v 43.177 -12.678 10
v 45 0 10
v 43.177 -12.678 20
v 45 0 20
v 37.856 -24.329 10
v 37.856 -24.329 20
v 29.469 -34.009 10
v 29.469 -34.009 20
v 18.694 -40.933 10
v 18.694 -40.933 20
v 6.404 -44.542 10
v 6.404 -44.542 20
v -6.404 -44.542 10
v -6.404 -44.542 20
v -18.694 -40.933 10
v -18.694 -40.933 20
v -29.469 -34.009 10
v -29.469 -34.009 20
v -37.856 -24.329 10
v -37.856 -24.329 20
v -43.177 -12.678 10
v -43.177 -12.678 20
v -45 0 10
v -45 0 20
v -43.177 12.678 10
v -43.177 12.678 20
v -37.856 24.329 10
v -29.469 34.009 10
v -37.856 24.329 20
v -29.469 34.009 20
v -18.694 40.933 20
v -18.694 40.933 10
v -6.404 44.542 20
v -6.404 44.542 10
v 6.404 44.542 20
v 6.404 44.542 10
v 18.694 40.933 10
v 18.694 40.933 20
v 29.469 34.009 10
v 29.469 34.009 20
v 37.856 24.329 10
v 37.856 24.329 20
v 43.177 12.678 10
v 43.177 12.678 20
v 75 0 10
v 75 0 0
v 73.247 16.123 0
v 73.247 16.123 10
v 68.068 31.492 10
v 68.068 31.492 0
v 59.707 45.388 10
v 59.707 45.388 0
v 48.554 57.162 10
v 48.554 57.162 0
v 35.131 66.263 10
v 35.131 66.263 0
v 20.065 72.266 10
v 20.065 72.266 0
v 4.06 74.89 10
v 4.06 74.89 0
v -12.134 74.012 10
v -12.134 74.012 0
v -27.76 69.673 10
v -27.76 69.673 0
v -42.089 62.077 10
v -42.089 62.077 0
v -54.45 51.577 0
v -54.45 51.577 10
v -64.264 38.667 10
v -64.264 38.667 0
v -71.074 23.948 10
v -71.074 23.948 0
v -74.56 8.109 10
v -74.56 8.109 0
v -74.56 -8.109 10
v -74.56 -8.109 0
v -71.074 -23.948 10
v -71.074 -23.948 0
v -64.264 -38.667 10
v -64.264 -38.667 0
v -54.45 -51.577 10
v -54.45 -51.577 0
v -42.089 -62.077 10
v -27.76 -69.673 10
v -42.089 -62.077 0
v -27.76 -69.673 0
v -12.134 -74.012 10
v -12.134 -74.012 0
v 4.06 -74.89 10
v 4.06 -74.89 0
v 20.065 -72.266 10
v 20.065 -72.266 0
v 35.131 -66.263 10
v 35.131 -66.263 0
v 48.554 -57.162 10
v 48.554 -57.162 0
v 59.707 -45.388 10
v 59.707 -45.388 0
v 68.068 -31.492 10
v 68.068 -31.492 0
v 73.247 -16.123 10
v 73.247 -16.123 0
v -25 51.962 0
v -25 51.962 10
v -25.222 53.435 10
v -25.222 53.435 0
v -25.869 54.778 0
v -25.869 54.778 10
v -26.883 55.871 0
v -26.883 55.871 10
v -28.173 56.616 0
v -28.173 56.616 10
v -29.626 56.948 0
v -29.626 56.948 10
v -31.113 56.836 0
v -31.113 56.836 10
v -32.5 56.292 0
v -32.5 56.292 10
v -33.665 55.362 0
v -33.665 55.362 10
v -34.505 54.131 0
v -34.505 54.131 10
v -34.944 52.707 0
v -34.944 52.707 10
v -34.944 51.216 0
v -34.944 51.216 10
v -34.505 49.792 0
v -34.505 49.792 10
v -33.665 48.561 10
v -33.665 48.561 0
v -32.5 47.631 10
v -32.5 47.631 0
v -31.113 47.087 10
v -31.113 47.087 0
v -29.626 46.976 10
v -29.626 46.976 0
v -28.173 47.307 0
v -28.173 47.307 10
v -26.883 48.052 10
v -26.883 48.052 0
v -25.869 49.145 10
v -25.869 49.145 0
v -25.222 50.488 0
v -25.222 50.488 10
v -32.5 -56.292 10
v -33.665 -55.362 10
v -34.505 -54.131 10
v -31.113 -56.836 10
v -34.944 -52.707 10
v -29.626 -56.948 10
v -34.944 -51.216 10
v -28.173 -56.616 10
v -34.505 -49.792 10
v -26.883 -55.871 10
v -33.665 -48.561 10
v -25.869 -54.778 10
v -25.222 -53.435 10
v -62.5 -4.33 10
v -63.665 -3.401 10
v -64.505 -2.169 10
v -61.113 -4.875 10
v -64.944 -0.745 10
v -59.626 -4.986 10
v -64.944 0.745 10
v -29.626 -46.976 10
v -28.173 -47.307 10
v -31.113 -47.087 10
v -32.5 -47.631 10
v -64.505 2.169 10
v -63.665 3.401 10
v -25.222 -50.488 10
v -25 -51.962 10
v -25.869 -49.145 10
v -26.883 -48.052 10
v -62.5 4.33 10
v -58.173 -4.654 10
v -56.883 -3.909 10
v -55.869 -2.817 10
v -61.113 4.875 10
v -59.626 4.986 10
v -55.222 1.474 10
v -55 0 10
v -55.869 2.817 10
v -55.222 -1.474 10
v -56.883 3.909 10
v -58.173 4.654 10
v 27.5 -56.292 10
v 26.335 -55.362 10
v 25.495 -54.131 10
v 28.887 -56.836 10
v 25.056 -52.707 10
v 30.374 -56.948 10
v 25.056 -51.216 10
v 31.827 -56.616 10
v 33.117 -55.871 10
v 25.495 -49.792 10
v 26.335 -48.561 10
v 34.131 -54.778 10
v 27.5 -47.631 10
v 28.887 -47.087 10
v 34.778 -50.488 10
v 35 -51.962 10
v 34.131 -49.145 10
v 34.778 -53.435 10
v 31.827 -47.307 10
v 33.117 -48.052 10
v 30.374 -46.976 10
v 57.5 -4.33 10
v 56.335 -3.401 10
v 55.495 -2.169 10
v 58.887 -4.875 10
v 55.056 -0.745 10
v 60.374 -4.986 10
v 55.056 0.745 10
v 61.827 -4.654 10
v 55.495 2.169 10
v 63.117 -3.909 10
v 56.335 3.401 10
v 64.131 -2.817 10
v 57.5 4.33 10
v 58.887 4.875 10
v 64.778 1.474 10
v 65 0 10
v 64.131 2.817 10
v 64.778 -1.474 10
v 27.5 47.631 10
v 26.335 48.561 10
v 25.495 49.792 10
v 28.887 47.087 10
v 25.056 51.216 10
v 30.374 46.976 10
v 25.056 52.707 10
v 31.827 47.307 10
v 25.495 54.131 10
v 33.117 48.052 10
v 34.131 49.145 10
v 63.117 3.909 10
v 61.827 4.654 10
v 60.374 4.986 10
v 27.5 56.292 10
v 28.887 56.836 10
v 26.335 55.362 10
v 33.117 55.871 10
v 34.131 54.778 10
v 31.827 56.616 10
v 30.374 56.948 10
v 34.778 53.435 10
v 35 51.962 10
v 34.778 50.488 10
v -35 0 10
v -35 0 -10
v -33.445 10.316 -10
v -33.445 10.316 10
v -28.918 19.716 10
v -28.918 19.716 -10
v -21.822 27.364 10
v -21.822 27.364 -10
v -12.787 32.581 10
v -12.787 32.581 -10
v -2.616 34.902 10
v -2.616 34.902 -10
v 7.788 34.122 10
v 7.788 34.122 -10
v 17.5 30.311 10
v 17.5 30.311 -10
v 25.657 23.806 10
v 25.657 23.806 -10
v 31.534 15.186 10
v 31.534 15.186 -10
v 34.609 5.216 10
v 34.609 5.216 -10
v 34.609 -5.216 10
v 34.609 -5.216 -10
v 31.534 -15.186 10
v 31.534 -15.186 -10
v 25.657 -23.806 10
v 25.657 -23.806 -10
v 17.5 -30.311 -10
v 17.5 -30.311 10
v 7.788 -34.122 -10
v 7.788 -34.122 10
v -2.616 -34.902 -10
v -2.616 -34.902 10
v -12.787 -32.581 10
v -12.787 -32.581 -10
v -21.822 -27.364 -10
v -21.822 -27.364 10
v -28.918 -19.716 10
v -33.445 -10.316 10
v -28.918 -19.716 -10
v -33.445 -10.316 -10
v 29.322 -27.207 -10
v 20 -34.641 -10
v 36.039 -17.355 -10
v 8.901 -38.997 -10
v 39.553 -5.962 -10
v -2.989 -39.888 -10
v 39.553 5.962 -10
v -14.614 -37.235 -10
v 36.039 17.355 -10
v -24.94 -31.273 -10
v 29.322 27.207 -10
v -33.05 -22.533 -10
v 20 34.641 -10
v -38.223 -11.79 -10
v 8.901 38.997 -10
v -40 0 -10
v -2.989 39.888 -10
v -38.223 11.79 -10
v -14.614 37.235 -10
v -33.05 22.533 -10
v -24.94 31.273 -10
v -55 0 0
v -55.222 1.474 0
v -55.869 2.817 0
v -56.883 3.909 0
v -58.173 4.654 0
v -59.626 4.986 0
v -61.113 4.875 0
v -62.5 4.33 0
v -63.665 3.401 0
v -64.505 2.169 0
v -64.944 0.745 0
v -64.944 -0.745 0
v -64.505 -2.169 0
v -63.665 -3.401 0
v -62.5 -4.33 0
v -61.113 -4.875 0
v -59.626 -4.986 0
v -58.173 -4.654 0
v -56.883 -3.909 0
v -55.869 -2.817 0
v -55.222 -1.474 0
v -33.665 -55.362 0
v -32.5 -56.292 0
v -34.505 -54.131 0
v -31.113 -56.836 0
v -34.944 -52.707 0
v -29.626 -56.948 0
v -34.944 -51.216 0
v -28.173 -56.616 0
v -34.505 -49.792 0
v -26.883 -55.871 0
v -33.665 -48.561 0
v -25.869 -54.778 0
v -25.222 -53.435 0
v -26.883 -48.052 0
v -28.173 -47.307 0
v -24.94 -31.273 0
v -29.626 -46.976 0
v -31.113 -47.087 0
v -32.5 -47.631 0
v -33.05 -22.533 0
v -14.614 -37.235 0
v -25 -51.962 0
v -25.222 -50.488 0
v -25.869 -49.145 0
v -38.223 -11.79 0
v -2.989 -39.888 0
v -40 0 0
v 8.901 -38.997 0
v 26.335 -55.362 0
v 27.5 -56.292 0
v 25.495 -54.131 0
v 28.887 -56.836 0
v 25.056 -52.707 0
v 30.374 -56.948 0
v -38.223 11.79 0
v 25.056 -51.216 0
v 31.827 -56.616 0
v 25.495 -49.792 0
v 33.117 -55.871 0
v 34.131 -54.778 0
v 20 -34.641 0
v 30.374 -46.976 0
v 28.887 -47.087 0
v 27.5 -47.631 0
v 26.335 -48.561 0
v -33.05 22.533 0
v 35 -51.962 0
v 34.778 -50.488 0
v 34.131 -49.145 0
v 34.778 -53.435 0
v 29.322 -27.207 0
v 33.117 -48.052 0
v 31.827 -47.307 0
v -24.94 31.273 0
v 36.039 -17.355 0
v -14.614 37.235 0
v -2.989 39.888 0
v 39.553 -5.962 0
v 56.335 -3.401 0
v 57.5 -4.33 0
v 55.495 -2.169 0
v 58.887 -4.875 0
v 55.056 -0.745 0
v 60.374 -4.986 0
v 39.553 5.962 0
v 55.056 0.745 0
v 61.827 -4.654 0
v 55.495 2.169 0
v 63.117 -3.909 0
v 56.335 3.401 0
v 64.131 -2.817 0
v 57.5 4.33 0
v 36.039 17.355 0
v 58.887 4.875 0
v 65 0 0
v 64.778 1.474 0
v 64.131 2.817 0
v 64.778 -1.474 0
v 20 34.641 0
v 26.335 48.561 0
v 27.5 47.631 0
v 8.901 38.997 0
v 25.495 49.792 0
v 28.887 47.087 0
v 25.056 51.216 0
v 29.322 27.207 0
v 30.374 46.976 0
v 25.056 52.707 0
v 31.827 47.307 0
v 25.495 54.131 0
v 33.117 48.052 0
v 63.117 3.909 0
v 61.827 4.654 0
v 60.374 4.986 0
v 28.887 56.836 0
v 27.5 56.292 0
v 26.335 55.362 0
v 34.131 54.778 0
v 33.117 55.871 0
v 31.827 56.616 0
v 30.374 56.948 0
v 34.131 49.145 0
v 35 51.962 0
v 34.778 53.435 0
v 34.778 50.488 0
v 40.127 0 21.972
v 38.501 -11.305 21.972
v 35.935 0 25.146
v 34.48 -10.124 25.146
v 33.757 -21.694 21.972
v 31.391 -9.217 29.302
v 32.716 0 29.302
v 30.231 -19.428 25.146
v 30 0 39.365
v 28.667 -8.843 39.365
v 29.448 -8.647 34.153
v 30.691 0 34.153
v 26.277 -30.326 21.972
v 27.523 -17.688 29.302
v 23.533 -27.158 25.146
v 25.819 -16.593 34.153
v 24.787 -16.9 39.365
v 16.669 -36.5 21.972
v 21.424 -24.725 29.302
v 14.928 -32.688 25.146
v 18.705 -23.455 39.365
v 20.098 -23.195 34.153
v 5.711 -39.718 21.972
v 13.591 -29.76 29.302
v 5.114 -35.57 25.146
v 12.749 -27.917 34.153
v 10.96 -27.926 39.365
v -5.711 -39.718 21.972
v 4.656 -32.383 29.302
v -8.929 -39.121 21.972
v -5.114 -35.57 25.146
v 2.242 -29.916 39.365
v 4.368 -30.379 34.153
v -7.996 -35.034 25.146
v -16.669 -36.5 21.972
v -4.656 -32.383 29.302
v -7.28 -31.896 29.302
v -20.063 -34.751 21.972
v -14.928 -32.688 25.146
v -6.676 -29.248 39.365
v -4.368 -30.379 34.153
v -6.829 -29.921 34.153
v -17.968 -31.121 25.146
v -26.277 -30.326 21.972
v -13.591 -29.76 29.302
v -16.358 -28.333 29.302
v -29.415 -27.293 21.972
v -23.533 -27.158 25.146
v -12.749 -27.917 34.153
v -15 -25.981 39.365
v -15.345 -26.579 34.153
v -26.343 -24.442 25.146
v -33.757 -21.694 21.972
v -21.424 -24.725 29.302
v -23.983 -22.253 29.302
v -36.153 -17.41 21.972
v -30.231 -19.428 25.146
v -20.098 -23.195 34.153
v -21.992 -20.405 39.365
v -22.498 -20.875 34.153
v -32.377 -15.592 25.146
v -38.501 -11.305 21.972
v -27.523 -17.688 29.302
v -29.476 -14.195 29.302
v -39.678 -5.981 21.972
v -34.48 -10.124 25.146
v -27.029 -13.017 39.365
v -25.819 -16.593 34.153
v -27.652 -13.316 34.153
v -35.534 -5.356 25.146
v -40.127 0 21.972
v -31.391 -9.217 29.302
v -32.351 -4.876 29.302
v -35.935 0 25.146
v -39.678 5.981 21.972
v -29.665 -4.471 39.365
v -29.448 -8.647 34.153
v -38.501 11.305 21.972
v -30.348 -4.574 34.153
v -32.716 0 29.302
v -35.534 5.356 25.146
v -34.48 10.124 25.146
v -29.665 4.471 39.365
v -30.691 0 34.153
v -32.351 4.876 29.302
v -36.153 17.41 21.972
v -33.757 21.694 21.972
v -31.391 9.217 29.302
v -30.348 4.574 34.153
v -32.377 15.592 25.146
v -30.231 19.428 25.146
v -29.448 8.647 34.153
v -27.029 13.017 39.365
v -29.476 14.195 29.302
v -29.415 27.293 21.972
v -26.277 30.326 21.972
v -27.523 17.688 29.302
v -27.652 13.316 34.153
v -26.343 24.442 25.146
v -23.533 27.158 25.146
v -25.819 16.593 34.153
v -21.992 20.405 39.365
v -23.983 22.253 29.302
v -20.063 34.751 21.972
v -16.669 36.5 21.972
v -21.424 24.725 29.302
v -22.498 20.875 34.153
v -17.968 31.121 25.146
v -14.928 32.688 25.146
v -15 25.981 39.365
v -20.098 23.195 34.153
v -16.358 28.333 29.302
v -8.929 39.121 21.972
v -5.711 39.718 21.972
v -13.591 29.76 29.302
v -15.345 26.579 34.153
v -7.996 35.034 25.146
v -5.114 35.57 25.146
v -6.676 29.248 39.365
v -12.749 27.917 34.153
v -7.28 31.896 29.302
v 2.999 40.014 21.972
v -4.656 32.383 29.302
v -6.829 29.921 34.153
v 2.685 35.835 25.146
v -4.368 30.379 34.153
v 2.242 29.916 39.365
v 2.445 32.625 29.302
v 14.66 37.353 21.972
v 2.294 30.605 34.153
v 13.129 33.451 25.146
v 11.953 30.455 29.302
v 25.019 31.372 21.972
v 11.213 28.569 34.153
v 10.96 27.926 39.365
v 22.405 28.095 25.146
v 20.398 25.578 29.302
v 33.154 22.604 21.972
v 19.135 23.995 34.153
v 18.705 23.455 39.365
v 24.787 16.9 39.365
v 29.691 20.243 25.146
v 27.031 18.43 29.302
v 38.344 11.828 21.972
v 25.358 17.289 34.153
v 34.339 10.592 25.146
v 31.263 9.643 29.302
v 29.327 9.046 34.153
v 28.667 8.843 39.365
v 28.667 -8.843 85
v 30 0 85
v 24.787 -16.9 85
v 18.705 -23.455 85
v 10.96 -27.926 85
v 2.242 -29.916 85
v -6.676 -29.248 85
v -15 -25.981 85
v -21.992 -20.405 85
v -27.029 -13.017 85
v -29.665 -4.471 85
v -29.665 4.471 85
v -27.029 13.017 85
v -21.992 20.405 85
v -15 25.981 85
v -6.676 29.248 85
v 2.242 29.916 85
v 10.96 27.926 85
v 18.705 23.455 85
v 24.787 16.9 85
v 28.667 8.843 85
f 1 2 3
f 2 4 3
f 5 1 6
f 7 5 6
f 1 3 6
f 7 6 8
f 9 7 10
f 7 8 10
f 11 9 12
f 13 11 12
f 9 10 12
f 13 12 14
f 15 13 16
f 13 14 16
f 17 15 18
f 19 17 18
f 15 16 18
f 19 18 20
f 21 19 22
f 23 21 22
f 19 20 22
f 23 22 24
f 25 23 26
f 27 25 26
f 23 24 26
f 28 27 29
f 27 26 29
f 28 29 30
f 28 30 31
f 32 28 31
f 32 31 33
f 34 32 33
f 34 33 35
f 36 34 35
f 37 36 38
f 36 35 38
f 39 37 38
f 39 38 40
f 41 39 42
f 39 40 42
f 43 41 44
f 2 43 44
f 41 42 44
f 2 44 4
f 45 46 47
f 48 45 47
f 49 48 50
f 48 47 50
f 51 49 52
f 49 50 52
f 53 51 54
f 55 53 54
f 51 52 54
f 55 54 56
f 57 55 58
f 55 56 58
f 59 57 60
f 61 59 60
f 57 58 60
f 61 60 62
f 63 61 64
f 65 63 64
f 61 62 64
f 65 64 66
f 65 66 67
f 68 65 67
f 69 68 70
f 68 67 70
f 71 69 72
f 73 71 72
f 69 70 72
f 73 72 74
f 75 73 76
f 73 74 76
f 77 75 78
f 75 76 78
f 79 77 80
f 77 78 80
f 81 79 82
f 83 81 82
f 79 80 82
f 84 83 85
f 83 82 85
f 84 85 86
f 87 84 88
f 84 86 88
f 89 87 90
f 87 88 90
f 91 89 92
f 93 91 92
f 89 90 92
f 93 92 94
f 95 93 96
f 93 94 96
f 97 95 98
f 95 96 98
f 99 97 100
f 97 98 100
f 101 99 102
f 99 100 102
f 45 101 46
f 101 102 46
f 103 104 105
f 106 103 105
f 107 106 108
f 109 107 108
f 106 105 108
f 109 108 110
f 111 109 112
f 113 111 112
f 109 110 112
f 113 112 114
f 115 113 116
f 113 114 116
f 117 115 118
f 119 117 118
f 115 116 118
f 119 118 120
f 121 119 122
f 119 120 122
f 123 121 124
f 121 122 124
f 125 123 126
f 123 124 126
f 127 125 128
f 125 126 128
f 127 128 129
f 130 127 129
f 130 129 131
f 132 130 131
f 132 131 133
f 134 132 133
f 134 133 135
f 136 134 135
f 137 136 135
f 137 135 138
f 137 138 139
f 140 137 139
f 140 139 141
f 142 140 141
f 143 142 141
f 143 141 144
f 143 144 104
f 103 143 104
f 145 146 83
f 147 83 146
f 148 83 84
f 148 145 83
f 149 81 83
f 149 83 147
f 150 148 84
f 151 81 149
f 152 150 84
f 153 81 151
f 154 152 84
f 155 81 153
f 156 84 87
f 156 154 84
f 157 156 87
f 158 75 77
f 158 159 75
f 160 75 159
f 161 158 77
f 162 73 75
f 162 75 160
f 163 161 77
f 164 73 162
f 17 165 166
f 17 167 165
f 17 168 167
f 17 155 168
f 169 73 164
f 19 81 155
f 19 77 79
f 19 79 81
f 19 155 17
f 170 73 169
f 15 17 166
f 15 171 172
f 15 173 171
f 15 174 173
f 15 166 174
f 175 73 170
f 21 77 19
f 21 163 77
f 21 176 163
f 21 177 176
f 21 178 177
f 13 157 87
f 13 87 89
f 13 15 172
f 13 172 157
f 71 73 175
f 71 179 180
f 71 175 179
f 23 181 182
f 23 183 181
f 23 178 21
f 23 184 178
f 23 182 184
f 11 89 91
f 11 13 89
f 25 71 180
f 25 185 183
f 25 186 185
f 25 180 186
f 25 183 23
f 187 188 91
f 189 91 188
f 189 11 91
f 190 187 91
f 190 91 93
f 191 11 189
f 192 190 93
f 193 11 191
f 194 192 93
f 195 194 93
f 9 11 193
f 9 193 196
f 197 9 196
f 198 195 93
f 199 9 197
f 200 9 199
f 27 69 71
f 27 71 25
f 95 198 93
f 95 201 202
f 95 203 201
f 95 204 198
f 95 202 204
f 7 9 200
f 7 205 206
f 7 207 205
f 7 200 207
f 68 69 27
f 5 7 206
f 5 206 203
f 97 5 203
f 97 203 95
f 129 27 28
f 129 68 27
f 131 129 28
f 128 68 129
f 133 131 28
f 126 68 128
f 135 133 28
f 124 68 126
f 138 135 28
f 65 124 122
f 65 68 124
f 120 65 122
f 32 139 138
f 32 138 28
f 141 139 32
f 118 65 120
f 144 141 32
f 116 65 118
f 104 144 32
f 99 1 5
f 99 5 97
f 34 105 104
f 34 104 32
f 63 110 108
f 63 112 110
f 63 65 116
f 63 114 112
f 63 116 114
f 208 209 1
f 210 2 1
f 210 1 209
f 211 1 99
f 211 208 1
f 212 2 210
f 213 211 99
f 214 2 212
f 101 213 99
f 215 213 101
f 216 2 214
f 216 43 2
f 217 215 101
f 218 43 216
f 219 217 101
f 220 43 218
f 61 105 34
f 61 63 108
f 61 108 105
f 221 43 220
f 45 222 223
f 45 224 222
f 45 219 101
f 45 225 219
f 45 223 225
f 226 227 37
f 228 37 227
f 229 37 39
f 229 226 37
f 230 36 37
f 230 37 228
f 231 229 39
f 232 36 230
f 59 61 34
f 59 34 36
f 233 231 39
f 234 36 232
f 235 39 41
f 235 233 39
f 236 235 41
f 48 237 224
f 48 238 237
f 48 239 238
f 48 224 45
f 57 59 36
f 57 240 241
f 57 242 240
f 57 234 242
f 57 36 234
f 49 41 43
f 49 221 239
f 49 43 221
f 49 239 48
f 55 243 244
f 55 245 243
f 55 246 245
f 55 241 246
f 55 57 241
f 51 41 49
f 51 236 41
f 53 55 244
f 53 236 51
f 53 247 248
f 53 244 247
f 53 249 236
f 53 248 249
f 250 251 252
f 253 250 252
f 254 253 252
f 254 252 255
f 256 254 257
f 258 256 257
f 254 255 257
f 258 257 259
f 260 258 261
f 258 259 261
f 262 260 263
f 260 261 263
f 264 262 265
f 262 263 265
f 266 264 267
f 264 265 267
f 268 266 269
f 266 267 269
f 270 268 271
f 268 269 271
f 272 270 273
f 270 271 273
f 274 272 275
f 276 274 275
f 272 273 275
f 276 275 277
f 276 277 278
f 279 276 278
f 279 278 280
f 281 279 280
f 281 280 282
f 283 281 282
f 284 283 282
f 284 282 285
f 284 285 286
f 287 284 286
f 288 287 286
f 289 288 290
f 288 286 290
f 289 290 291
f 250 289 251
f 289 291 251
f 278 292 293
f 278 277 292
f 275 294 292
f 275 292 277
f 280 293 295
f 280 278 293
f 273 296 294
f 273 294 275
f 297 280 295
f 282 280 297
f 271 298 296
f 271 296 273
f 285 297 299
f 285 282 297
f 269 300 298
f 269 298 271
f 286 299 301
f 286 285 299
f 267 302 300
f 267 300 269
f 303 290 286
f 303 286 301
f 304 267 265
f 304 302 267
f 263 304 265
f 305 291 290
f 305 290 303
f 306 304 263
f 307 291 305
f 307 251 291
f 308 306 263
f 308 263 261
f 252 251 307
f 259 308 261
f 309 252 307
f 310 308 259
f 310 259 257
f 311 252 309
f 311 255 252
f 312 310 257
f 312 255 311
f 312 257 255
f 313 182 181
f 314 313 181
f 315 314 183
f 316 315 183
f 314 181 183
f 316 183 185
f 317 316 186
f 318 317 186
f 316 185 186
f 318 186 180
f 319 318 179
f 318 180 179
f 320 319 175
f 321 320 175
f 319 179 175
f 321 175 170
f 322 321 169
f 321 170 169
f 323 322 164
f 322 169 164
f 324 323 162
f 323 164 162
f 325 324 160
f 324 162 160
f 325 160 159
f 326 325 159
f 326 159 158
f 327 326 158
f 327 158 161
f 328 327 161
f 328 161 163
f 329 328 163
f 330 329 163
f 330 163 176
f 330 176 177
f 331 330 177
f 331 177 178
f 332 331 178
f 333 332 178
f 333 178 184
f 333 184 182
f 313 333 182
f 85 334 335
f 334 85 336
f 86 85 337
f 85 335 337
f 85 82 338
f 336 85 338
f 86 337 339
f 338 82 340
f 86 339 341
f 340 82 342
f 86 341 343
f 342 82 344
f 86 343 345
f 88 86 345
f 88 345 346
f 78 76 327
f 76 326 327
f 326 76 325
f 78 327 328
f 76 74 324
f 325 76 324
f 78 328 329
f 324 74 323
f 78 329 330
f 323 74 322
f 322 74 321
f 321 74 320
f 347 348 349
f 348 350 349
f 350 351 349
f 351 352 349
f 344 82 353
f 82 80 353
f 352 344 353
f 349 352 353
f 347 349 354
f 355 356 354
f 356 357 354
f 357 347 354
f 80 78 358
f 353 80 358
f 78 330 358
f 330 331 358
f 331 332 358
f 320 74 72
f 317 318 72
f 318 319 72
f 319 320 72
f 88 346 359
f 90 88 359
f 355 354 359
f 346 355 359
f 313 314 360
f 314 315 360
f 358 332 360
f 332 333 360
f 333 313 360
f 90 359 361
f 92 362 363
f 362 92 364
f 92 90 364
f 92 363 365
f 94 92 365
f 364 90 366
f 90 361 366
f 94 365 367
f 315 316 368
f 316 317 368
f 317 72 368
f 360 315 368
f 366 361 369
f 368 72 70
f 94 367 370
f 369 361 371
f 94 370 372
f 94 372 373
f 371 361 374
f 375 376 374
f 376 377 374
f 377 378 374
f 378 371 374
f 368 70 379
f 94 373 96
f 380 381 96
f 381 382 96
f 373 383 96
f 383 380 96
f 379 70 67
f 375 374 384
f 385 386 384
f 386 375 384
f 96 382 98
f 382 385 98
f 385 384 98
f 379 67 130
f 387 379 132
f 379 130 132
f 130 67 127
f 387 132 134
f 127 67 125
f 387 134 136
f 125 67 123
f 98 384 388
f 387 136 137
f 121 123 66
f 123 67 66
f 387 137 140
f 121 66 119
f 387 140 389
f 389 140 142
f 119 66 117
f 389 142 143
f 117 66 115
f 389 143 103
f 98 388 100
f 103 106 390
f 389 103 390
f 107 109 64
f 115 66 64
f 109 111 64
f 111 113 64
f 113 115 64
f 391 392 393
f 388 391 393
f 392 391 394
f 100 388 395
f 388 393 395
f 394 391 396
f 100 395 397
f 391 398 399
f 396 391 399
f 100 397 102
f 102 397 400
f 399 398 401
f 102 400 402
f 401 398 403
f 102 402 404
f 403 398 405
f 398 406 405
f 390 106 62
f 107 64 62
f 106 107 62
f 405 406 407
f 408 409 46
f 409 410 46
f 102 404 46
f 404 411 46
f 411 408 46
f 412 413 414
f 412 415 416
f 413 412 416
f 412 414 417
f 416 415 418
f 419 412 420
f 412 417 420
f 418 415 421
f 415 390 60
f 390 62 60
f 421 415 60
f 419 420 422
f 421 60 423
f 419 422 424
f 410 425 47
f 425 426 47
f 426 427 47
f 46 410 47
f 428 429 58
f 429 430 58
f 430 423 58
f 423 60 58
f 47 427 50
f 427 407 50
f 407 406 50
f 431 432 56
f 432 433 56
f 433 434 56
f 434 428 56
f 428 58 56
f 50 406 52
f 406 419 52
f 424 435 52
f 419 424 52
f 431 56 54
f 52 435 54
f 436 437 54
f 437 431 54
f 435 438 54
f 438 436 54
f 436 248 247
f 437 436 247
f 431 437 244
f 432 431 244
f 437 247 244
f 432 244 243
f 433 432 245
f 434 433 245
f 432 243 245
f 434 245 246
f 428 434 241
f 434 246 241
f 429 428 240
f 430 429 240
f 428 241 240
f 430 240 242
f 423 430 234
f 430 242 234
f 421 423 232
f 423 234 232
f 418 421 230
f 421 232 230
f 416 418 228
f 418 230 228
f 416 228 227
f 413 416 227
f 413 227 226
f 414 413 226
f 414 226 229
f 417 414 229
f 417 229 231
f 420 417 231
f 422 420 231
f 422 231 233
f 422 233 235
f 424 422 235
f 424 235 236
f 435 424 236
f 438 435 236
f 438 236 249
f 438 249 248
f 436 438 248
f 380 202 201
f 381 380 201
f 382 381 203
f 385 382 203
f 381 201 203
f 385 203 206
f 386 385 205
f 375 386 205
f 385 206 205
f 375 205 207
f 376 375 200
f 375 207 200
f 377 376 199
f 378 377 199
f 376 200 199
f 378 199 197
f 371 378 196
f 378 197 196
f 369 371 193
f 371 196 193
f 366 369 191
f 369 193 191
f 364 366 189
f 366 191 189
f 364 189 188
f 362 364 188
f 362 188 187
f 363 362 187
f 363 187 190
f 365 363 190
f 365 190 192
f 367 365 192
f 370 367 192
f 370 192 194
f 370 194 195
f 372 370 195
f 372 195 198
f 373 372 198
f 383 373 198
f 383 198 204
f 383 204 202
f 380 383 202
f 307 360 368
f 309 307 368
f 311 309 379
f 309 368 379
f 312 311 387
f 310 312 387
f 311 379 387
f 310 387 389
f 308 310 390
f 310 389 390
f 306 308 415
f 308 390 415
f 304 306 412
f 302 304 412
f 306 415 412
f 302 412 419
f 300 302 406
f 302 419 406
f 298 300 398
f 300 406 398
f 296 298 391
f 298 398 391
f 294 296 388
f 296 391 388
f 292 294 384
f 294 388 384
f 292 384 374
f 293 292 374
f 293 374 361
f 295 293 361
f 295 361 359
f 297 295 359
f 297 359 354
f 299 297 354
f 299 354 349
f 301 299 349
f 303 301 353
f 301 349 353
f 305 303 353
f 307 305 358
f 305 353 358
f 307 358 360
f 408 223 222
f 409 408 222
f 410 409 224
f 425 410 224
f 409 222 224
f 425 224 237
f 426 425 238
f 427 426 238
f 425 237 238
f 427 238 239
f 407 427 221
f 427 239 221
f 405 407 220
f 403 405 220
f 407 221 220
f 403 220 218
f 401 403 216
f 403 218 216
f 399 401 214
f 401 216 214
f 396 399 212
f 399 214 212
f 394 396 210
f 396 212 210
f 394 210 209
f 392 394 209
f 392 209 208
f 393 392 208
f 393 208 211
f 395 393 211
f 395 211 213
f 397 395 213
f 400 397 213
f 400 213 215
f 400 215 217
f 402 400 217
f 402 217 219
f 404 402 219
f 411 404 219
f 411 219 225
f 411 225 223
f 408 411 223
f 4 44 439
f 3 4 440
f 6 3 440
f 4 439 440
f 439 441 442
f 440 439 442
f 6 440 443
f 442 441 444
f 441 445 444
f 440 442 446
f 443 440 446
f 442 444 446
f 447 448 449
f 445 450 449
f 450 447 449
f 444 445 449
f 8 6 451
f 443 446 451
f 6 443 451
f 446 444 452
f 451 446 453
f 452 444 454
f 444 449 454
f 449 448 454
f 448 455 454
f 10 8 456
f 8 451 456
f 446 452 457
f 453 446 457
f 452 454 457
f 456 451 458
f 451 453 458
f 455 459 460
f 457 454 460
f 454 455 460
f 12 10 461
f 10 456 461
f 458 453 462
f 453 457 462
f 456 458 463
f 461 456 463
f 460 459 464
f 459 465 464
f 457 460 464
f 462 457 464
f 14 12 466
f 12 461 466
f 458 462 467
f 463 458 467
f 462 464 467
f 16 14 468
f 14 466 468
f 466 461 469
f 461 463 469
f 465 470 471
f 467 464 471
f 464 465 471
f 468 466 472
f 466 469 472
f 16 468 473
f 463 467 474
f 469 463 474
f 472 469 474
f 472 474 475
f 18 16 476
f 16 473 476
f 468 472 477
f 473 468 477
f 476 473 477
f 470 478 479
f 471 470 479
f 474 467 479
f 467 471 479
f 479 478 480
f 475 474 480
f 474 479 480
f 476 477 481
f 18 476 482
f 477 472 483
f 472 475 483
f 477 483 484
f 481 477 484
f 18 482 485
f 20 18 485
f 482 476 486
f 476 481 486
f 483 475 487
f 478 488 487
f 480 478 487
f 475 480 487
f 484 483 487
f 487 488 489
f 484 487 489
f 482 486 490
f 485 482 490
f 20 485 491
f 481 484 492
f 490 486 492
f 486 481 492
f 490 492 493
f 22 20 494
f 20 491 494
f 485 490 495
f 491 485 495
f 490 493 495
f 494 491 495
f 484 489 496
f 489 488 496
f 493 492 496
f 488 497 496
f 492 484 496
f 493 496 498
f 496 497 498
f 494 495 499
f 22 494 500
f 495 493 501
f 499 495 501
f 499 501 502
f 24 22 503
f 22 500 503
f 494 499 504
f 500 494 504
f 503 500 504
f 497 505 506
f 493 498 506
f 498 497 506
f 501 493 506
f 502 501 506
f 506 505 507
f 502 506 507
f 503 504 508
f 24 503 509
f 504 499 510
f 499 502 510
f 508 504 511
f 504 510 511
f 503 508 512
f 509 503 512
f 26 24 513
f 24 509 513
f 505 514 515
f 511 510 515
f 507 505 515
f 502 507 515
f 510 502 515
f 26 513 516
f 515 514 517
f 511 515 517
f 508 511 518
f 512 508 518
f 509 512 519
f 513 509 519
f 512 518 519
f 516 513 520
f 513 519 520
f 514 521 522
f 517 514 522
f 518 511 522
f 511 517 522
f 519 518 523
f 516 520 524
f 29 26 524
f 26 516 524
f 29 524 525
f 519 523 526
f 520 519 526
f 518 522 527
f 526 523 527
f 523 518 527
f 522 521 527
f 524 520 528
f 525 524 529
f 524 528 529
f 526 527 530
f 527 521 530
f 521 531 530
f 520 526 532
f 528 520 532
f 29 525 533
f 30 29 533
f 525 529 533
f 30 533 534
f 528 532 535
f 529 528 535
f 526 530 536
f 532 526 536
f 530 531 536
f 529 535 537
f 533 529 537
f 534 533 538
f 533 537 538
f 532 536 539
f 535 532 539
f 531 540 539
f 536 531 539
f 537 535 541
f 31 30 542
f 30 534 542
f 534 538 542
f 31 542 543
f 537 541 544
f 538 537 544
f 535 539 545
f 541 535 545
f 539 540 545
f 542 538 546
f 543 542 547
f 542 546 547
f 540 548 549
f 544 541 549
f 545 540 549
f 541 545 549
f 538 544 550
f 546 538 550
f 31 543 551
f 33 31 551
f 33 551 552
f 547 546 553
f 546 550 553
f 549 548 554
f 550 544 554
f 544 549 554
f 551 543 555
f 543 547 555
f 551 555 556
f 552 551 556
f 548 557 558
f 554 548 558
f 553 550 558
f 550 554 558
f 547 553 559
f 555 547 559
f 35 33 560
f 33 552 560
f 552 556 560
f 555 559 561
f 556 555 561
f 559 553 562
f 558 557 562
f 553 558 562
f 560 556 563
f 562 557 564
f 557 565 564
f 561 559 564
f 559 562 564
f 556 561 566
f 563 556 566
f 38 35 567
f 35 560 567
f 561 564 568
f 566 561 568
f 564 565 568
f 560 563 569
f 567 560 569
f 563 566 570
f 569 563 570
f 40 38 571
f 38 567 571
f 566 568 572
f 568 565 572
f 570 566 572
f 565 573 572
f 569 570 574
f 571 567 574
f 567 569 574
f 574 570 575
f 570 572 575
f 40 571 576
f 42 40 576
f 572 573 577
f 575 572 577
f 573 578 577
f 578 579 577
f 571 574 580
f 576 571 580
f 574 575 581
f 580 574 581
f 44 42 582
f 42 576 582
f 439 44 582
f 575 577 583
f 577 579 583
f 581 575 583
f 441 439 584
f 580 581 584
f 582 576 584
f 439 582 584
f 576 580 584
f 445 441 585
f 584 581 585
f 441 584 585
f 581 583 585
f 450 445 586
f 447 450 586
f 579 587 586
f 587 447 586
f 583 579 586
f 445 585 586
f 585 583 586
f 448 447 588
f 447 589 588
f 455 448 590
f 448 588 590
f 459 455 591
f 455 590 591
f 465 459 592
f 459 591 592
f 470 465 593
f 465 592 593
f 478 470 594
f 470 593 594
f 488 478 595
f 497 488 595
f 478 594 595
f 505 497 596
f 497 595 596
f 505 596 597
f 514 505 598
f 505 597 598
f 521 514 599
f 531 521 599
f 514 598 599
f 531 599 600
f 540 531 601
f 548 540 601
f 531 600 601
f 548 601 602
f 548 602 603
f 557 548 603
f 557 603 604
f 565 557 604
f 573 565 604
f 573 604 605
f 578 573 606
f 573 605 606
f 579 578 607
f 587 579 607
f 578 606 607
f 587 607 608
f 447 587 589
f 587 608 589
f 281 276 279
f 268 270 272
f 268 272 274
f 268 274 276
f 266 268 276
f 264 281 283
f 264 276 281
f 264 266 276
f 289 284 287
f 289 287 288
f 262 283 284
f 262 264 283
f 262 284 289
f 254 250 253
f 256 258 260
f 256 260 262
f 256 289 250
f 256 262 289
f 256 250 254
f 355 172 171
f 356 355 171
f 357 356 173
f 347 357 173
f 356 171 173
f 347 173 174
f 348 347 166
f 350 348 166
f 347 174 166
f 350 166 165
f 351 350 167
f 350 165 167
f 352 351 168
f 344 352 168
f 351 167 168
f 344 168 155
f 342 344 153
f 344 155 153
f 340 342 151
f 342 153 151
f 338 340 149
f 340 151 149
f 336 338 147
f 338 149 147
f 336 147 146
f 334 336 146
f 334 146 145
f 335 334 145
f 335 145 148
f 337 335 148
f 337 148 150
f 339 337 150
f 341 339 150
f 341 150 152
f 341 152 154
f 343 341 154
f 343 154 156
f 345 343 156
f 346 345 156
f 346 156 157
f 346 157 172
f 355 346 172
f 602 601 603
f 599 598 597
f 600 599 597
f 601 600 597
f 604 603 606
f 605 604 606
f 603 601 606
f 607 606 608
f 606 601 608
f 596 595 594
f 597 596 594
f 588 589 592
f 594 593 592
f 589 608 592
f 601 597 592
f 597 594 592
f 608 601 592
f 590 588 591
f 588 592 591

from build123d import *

# Parameters (mm, degrees)
SKETCH1_R           = 75
BOSS_EXTRUDE1_DEPTH = 10
SKETCH3_R           = 40
BOSS_EXTRUDE2_DEPTH = 10
SKETCH4_R           = 35
CUT_EXTRUDE1_DEPTH  = 20
SKETCH5_R           = 5
CUT_EXTRUDE2_DEPTH  = 20


with BuildPart() as part:
    # Sketch1 → Boss-Extrude1 (new body)
    with BuildSketch(Plane.XY):
        Circle(SKETCH1_R)
    extrude(amount=BOSS_EXTRUDE1_DEPTH)

    # Sketch2 → Revolve1 (revolve)
    with BuildSketch(Plane(origin=(0, 0, 0), x_dir=(0, 0, -1), z_dir=(1, 0, 0)), mode=Mode.PRIVATE) as revolve1_sk:
        with BuildLine():
            Line((-10, 45), (-20, 45))
            ThreePointArc((-20, 45), (-27.117468017, 34.188611699), (-39.364916731, 30))
            Line((-39.364916731, 30), (-85, 30))
            Line((-85, 30), (-85, 0))
            Line((-85, 0), (-10, 0))
            Line((-10, 0), (-10, 45))
        make_face()
    revolve(revolve1_sk.sketch.rotate(Axis((0, 0, 1000), (0, 0, -1)), 90), axis=Axis((0, 0, 1000), (0, 0, -1)))

    # Sketch3 → Boss-Extrude2 (add)
    with BuildSketch(Plane(origin=(0, 0, 0), x_dir=(-1, 0, 0), z_dir=(0, 0, -1))):
        Circle(SKETCH3_R)
    extrude(amount=BOSS_EXTRUDE2_DEPTH)

    # Sketch4 → Cut-Extrude1 (cut)
    with BuildSketch(Plane(origin=(0, 0, -10), x_dir=(-1, 0, 0), z_dir=(0, 0, -1))):
        Circle(SKETCH4_R)
    extrude(amount=-CUT_EXTRUDE1_DEPTH, mode=Mode.SUBTRACT)

    # Sketch5 → Cut-Extrude2 (cut)
    with BuildSketch(Plane.XY.offset(10)):
        with Locations((60, 0)):
            Circle(SKETCH5_R)
        with Locations((30, -51.961524227)):
            Circle(SKETCH5_R)
        with Locations((-30, -51.961524227)):
            Circle(SKETCH5_R)
        with Locations((-60, 0)):
            Circle(SKETCH5_R)
        with Locations((-30, 51.961524227)):
            Circle(SKETCH5_R)
        with Locations((30, 51.961524227)):
            Circle(SKETCH5_R)
    extrude(amount=-CUT_EXTRUDE2_DEPTH, mode=Mode.SUBTRACT)


solid = part.part
